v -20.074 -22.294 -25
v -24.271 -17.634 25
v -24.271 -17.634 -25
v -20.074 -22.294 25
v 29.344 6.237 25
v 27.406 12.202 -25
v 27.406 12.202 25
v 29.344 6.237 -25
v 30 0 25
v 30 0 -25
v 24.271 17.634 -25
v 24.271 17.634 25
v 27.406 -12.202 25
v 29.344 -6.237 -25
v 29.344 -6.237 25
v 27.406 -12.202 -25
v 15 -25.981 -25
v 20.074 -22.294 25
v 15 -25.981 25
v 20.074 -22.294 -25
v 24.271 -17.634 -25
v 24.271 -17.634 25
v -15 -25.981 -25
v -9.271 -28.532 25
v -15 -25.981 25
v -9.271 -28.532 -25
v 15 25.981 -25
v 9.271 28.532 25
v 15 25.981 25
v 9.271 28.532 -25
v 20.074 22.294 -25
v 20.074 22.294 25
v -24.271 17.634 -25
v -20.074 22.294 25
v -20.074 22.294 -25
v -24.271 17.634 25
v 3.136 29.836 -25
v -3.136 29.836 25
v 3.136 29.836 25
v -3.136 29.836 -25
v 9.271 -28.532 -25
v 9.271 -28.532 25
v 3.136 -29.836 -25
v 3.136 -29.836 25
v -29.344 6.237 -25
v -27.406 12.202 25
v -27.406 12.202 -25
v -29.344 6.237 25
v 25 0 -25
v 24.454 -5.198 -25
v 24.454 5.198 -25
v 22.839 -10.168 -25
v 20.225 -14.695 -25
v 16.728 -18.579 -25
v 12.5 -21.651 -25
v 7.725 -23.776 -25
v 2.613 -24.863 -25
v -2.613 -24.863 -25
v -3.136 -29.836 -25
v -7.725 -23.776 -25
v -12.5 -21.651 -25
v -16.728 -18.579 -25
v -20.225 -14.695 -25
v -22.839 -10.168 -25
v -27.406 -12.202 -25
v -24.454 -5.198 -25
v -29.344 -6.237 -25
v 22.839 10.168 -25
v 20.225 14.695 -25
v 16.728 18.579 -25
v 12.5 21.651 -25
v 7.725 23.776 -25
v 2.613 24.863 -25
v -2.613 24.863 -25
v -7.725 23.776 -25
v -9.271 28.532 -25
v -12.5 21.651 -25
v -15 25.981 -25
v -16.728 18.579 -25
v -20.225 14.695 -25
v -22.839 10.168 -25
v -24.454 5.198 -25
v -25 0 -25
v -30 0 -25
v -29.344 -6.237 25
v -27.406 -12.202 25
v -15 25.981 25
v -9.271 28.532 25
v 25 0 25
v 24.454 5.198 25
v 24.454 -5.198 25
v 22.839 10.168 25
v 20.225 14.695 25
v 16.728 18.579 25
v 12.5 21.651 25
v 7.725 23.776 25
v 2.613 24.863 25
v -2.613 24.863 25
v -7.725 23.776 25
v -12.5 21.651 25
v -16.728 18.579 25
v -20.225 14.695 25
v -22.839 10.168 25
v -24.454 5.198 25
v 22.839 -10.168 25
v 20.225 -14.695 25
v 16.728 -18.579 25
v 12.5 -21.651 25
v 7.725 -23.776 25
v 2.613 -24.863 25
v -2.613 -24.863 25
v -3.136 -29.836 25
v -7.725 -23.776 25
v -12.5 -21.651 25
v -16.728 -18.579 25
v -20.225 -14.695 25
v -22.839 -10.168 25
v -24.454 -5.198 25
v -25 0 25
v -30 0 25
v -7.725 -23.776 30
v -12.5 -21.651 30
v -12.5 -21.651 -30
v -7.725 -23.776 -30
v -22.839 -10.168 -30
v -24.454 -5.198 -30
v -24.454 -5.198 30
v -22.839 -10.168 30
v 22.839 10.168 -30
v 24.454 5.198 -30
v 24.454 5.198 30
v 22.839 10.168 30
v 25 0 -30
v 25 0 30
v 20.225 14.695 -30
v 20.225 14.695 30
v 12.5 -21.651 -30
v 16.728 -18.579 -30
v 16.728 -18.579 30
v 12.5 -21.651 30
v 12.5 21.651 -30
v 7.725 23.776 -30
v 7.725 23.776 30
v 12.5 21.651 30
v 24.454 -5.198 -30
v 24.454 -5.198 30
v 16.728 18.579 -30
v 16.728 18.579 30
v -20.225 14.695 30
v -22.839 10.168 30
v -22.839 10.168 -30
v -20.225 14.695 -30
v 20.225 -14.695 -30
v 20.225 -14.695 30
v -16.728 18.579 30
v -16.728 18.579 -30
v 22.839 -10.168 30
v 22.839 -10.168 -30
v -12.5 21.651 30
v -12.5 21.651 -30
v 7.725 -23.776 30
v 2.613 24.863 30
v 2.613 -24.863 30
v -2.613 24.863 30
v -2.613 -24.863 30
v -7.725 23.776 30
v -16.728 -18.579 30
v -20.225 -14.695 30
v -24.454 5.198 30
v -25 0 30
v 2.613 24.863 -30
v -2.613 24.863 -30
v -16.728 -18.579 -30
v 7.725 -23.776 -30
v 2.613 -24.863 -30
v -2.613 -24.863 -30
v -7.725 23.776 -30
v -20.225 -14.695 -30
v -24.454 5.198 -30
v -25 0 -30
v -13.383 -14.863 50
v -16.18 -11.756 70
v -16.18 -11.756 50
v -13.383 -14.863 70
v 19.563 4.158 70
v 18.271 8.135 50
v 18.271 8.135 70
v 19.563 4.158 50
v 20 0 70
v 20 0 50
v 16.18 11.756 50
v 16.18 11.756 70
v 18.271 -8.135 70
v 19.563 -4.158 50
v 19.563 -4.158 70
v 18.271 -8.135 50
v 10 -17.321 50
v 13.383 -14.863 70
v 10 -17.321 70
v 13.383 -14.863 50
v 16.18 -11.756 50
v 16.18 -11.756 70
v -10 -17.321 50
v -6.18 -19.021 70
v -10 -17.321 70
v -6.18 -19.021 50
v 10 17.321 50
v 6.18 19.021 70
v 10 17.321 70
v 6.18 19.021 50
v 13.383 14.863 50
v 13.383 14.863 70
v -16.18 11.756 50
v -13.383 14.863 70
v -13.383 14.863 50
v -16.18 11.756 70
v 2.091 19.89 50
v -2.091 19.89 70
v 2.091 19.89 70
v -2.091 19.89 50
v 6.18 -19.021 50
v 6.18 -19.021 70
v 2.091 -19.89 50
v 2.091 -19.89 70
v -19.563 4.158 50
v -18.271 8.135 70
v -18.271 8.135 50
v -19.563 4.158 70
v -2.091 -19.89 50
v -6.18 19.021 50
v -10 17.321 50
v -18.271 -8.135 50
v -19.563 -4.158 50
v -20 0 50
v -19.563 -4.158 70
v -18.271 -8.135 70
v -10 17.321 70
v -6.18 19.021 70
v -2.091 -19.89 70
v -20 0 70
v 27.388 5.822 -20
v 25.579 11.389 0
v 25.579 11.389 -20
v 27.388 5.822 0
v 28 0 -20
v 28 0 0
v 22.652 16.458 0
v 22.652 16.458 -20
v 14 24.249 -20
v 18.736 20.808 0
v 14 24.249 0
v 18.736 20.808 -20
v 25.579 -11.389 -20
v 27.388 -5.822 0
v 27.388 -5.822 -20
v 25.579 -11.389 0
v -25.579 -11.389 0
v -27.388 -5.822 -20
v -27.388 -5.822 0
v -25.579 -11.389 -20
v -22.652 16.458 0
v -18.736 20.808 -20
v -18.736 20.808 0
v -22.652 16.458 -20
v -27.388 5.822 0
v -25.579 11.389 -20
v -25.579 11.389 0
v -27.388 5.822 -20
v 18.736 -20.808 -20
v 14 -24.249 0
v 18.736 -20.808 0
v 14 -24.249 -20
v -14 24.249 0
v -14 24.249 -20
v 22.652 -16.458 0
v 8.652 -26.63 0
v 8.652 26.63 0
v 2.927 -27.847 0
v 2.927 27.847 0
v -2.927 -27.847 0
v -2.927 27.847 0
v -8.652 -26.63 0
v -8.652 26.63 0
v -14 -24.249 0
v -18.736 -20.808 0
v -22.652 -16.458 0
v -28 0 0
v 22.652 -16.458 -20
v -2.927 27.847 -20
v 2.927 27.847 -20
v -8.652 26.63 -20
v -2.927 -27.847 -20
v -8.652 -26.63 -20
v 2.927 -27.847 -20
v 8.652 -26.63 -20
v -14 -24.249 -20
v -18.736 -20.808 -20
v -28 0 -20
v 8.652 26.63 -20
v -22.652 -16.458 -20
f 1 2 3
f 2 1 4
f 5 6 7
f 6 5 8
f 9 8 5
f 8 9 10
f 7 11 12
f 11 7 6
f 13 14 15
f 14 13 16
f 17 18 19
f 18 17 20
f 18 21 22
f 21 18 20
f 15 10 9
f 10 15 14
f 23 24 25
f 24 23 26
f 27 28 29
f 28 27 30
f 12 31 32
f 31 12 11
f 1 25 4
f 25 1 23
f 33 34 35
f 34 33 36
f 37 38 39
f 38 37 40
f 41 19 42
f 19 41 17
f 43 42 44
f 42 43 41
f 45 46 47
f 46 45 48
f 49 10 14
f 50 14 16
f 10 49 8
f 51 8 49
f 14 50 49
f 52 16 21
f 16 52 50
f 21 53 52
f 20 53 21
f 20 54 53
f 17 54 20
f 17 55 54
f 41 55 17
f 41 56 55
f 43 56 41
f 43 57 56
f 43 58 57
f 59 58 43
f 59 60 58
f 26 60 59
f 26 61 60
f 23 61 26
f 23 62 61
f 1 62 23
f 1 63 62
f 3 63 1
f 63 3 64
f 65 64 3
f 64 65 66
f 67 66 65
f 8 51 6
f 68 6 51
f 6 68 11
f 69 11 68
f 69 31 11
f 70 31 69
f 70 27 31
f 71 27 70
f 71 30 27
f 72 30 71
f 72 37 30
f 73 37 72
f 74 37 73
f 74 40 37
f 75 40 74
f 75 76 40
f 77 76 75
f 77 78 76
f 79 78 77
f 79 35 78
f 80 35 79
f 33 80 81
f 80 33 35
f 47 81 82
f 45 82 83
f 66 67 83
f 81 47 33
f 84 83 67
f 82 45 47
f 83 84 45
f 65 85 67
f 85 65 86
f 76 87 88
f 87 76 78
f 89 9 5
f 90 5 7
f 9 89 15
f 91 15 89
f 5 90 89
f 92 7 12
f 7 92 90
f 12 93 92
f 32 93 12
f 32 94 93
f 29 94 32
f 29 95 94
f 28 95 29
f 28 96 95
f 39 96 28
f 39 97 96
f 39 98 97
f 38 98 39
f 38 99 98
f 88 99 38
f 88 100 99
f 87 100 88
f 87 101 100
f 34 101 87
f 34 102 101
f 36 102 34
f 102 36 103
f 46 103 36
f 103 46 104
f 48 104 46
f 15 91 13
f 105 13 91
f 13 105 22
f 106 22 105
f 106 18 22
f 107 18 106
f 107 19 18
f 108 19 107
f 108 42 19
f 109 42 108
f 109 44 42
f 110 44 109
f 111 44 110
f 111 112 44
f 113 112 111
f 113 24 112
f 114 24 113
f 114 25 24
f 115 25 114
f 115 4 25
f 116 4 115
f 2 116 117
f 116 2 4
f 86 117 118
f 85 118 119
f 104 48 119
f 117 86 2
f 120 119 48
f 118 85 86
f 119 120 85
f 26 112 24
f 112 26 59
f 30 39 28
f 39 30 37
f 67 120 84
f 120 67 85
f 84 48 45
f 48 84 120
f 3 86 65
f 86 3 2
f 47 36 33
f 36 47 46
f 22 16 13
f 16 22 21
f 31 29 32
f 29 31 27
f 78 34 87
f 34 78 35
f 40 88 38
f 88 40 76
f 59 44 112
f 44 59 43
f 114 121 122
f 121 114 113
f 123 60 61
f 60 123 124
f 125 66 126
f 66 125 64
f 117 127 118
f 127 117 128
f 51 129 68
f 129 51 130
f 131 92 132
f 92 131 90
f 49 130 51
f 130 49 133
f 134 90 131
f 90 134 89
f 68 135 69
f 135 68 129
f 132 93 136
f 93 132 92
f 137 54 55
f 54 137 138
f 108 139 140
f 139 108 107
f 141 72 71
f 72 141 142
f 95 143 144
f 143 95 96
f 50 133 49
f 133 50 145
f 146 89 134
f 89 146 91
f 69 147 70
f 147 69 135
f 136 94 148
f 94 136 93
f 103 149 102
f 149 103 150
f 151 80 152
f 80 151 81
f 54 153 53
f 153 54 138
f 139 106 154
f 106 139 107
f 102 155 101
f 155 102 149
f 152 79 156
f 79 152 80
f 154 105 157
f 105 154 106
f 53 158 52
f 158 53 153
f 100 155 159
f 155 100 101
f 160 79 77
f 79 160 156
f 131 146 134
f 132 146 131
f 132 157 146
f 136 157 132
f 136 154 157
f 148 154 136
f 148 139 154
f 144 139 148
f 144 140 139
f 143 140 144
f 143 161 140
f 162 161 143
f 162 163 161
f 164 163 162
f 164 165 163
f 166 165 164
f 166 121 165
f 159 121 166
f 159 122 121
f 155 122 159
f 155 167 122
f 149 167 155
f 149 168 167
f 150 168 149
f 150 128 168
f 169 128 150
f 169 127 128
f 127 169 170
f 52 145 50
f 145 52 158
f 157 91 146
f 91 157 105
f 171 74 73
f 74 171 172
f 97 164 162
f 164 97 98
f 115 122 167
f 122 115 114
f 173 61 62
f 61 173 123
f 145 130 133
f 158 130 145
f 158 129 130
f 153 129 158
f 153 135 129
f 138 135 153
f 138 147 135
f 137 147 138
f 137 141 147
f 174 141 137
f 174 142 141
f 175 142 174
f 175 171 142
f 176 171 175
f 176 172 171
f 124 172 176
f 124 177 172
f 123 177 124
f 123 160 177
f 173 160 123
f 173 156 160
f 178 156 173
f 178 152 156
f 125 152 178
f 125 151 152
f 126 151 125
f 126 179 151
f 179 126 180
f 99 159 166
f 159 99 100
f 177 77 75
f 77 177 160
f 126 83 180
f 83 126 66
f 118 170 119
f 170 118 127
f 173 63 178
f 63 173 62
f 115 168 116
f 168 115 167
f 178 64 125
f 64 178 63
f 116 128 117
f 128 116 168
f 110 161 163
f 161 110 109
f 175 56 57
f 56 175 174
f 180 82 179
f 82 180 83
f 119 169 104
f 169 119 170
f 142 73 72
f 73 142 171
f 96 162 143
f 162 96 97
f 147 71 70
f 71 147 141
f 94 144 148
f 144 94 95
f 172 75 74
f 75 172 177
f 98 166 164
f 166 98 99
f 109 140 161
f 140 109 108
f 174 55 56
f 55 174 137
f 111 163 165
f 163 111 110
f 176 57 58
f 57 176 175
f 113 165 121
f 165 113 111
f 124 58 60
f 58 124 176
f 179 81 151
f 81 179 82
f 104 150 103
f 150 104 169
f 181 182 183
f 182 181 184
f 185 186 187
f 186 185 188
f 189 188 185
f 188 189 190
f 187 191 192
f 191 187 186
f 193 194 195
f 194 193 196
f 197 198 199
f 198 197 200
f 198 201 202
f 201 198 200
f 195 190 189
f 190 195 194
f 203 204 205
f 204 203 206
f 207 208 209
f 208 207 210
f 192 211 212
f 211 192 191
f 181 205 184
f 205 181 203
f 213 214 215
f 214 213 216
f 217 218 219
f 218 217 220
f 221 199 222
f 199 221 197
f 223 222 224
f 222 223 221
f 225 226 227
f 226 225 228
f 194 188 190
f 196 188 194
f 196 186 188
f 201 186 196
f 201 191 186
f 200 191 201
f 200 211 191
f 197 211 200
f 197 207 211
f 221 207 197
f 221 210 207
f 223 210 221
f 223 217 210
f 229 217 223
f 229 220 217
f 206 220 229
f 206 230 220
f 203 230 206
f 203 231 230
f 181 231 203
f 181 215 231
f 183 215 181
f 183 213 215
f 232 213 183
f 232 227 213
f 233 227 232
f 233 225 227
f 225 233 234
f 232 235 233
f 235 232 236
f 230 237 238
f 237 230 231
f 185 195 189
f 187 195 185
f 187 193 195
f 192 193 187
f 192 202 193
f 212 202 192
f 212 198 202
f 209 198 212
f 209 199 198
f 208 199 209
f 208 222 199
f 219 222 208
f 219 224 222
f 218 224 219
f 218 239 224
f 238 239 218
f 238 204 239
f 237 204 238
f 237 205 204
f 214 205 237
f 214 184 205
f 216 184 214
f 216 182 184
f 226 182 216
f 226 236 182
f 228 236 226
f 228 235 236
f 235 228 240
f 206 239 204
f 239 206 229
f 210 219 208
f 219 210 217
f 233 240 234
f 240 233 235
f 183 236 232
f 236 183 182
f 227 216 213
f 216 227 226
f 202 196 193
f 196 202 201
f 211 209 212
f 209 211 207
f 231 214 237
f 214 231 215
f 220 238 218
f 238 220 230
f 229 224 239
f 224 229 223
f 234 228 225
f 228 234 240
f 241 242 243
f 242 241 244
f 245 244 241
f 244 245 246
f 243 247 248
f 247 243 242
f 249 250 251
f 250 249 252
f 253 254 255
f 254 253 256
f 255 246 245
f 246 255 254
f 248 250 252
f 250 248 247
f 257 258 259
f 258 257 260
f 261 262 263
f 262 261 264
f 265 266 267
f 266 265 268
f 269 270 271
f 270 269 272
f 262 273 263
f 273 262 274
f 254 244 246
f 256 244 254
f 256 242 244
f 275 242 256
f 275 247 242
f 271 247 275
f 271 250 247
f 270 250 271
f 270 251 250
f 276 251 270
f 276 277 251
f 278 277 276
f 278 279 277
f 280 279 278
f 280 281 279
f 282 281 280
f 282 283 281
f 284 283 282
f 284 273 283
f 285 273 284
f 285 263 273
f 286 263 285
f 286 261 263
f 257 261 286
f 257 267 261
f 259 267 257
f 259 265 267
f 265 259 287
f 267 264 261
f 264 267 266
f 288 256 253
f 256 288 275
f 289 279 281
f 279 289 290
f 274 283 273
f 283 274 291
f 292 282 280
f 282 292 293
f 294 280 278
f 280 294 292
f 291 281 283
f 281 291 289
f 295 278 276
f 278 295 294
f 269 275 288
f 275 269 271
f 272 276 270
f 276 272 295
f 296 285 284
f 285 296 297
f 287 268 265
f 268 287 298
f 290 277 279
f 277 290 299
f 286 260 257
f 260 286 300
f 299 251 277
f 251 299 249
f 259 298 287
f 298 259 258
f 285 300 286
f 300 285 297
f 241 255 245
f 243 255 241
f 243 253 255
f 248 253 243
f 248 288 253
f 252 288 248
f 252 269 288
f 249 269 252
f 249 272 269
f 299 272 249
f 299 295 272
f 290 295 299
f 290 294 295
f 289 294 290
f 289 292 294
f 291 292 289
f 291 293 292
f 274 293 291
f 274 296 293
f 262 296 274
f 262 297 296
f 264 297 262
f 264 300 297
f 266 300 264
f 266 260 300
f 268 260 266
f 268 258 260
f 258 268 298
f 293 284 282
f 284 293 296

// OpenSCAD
//
//   Code generated by ChatGPT for the query below
//
//   Can you write me OpenSCAD code to create a model of a kettle?
//
//   Created Jan 2023 by Jenny List, for a Hackaday article.
//

module kettle() {
  difference() {
    union() {
      cylinder(r=30, h=50, center=true);
      cylinder(r=25, h=60, center=true);
      translate([0, 0, 60]) cylinder(r=20, h=20, center=true);
    }
    translate([0, 0, -10]) cylinder(r=28, h=20, center=true);
  }
}

kettle();
